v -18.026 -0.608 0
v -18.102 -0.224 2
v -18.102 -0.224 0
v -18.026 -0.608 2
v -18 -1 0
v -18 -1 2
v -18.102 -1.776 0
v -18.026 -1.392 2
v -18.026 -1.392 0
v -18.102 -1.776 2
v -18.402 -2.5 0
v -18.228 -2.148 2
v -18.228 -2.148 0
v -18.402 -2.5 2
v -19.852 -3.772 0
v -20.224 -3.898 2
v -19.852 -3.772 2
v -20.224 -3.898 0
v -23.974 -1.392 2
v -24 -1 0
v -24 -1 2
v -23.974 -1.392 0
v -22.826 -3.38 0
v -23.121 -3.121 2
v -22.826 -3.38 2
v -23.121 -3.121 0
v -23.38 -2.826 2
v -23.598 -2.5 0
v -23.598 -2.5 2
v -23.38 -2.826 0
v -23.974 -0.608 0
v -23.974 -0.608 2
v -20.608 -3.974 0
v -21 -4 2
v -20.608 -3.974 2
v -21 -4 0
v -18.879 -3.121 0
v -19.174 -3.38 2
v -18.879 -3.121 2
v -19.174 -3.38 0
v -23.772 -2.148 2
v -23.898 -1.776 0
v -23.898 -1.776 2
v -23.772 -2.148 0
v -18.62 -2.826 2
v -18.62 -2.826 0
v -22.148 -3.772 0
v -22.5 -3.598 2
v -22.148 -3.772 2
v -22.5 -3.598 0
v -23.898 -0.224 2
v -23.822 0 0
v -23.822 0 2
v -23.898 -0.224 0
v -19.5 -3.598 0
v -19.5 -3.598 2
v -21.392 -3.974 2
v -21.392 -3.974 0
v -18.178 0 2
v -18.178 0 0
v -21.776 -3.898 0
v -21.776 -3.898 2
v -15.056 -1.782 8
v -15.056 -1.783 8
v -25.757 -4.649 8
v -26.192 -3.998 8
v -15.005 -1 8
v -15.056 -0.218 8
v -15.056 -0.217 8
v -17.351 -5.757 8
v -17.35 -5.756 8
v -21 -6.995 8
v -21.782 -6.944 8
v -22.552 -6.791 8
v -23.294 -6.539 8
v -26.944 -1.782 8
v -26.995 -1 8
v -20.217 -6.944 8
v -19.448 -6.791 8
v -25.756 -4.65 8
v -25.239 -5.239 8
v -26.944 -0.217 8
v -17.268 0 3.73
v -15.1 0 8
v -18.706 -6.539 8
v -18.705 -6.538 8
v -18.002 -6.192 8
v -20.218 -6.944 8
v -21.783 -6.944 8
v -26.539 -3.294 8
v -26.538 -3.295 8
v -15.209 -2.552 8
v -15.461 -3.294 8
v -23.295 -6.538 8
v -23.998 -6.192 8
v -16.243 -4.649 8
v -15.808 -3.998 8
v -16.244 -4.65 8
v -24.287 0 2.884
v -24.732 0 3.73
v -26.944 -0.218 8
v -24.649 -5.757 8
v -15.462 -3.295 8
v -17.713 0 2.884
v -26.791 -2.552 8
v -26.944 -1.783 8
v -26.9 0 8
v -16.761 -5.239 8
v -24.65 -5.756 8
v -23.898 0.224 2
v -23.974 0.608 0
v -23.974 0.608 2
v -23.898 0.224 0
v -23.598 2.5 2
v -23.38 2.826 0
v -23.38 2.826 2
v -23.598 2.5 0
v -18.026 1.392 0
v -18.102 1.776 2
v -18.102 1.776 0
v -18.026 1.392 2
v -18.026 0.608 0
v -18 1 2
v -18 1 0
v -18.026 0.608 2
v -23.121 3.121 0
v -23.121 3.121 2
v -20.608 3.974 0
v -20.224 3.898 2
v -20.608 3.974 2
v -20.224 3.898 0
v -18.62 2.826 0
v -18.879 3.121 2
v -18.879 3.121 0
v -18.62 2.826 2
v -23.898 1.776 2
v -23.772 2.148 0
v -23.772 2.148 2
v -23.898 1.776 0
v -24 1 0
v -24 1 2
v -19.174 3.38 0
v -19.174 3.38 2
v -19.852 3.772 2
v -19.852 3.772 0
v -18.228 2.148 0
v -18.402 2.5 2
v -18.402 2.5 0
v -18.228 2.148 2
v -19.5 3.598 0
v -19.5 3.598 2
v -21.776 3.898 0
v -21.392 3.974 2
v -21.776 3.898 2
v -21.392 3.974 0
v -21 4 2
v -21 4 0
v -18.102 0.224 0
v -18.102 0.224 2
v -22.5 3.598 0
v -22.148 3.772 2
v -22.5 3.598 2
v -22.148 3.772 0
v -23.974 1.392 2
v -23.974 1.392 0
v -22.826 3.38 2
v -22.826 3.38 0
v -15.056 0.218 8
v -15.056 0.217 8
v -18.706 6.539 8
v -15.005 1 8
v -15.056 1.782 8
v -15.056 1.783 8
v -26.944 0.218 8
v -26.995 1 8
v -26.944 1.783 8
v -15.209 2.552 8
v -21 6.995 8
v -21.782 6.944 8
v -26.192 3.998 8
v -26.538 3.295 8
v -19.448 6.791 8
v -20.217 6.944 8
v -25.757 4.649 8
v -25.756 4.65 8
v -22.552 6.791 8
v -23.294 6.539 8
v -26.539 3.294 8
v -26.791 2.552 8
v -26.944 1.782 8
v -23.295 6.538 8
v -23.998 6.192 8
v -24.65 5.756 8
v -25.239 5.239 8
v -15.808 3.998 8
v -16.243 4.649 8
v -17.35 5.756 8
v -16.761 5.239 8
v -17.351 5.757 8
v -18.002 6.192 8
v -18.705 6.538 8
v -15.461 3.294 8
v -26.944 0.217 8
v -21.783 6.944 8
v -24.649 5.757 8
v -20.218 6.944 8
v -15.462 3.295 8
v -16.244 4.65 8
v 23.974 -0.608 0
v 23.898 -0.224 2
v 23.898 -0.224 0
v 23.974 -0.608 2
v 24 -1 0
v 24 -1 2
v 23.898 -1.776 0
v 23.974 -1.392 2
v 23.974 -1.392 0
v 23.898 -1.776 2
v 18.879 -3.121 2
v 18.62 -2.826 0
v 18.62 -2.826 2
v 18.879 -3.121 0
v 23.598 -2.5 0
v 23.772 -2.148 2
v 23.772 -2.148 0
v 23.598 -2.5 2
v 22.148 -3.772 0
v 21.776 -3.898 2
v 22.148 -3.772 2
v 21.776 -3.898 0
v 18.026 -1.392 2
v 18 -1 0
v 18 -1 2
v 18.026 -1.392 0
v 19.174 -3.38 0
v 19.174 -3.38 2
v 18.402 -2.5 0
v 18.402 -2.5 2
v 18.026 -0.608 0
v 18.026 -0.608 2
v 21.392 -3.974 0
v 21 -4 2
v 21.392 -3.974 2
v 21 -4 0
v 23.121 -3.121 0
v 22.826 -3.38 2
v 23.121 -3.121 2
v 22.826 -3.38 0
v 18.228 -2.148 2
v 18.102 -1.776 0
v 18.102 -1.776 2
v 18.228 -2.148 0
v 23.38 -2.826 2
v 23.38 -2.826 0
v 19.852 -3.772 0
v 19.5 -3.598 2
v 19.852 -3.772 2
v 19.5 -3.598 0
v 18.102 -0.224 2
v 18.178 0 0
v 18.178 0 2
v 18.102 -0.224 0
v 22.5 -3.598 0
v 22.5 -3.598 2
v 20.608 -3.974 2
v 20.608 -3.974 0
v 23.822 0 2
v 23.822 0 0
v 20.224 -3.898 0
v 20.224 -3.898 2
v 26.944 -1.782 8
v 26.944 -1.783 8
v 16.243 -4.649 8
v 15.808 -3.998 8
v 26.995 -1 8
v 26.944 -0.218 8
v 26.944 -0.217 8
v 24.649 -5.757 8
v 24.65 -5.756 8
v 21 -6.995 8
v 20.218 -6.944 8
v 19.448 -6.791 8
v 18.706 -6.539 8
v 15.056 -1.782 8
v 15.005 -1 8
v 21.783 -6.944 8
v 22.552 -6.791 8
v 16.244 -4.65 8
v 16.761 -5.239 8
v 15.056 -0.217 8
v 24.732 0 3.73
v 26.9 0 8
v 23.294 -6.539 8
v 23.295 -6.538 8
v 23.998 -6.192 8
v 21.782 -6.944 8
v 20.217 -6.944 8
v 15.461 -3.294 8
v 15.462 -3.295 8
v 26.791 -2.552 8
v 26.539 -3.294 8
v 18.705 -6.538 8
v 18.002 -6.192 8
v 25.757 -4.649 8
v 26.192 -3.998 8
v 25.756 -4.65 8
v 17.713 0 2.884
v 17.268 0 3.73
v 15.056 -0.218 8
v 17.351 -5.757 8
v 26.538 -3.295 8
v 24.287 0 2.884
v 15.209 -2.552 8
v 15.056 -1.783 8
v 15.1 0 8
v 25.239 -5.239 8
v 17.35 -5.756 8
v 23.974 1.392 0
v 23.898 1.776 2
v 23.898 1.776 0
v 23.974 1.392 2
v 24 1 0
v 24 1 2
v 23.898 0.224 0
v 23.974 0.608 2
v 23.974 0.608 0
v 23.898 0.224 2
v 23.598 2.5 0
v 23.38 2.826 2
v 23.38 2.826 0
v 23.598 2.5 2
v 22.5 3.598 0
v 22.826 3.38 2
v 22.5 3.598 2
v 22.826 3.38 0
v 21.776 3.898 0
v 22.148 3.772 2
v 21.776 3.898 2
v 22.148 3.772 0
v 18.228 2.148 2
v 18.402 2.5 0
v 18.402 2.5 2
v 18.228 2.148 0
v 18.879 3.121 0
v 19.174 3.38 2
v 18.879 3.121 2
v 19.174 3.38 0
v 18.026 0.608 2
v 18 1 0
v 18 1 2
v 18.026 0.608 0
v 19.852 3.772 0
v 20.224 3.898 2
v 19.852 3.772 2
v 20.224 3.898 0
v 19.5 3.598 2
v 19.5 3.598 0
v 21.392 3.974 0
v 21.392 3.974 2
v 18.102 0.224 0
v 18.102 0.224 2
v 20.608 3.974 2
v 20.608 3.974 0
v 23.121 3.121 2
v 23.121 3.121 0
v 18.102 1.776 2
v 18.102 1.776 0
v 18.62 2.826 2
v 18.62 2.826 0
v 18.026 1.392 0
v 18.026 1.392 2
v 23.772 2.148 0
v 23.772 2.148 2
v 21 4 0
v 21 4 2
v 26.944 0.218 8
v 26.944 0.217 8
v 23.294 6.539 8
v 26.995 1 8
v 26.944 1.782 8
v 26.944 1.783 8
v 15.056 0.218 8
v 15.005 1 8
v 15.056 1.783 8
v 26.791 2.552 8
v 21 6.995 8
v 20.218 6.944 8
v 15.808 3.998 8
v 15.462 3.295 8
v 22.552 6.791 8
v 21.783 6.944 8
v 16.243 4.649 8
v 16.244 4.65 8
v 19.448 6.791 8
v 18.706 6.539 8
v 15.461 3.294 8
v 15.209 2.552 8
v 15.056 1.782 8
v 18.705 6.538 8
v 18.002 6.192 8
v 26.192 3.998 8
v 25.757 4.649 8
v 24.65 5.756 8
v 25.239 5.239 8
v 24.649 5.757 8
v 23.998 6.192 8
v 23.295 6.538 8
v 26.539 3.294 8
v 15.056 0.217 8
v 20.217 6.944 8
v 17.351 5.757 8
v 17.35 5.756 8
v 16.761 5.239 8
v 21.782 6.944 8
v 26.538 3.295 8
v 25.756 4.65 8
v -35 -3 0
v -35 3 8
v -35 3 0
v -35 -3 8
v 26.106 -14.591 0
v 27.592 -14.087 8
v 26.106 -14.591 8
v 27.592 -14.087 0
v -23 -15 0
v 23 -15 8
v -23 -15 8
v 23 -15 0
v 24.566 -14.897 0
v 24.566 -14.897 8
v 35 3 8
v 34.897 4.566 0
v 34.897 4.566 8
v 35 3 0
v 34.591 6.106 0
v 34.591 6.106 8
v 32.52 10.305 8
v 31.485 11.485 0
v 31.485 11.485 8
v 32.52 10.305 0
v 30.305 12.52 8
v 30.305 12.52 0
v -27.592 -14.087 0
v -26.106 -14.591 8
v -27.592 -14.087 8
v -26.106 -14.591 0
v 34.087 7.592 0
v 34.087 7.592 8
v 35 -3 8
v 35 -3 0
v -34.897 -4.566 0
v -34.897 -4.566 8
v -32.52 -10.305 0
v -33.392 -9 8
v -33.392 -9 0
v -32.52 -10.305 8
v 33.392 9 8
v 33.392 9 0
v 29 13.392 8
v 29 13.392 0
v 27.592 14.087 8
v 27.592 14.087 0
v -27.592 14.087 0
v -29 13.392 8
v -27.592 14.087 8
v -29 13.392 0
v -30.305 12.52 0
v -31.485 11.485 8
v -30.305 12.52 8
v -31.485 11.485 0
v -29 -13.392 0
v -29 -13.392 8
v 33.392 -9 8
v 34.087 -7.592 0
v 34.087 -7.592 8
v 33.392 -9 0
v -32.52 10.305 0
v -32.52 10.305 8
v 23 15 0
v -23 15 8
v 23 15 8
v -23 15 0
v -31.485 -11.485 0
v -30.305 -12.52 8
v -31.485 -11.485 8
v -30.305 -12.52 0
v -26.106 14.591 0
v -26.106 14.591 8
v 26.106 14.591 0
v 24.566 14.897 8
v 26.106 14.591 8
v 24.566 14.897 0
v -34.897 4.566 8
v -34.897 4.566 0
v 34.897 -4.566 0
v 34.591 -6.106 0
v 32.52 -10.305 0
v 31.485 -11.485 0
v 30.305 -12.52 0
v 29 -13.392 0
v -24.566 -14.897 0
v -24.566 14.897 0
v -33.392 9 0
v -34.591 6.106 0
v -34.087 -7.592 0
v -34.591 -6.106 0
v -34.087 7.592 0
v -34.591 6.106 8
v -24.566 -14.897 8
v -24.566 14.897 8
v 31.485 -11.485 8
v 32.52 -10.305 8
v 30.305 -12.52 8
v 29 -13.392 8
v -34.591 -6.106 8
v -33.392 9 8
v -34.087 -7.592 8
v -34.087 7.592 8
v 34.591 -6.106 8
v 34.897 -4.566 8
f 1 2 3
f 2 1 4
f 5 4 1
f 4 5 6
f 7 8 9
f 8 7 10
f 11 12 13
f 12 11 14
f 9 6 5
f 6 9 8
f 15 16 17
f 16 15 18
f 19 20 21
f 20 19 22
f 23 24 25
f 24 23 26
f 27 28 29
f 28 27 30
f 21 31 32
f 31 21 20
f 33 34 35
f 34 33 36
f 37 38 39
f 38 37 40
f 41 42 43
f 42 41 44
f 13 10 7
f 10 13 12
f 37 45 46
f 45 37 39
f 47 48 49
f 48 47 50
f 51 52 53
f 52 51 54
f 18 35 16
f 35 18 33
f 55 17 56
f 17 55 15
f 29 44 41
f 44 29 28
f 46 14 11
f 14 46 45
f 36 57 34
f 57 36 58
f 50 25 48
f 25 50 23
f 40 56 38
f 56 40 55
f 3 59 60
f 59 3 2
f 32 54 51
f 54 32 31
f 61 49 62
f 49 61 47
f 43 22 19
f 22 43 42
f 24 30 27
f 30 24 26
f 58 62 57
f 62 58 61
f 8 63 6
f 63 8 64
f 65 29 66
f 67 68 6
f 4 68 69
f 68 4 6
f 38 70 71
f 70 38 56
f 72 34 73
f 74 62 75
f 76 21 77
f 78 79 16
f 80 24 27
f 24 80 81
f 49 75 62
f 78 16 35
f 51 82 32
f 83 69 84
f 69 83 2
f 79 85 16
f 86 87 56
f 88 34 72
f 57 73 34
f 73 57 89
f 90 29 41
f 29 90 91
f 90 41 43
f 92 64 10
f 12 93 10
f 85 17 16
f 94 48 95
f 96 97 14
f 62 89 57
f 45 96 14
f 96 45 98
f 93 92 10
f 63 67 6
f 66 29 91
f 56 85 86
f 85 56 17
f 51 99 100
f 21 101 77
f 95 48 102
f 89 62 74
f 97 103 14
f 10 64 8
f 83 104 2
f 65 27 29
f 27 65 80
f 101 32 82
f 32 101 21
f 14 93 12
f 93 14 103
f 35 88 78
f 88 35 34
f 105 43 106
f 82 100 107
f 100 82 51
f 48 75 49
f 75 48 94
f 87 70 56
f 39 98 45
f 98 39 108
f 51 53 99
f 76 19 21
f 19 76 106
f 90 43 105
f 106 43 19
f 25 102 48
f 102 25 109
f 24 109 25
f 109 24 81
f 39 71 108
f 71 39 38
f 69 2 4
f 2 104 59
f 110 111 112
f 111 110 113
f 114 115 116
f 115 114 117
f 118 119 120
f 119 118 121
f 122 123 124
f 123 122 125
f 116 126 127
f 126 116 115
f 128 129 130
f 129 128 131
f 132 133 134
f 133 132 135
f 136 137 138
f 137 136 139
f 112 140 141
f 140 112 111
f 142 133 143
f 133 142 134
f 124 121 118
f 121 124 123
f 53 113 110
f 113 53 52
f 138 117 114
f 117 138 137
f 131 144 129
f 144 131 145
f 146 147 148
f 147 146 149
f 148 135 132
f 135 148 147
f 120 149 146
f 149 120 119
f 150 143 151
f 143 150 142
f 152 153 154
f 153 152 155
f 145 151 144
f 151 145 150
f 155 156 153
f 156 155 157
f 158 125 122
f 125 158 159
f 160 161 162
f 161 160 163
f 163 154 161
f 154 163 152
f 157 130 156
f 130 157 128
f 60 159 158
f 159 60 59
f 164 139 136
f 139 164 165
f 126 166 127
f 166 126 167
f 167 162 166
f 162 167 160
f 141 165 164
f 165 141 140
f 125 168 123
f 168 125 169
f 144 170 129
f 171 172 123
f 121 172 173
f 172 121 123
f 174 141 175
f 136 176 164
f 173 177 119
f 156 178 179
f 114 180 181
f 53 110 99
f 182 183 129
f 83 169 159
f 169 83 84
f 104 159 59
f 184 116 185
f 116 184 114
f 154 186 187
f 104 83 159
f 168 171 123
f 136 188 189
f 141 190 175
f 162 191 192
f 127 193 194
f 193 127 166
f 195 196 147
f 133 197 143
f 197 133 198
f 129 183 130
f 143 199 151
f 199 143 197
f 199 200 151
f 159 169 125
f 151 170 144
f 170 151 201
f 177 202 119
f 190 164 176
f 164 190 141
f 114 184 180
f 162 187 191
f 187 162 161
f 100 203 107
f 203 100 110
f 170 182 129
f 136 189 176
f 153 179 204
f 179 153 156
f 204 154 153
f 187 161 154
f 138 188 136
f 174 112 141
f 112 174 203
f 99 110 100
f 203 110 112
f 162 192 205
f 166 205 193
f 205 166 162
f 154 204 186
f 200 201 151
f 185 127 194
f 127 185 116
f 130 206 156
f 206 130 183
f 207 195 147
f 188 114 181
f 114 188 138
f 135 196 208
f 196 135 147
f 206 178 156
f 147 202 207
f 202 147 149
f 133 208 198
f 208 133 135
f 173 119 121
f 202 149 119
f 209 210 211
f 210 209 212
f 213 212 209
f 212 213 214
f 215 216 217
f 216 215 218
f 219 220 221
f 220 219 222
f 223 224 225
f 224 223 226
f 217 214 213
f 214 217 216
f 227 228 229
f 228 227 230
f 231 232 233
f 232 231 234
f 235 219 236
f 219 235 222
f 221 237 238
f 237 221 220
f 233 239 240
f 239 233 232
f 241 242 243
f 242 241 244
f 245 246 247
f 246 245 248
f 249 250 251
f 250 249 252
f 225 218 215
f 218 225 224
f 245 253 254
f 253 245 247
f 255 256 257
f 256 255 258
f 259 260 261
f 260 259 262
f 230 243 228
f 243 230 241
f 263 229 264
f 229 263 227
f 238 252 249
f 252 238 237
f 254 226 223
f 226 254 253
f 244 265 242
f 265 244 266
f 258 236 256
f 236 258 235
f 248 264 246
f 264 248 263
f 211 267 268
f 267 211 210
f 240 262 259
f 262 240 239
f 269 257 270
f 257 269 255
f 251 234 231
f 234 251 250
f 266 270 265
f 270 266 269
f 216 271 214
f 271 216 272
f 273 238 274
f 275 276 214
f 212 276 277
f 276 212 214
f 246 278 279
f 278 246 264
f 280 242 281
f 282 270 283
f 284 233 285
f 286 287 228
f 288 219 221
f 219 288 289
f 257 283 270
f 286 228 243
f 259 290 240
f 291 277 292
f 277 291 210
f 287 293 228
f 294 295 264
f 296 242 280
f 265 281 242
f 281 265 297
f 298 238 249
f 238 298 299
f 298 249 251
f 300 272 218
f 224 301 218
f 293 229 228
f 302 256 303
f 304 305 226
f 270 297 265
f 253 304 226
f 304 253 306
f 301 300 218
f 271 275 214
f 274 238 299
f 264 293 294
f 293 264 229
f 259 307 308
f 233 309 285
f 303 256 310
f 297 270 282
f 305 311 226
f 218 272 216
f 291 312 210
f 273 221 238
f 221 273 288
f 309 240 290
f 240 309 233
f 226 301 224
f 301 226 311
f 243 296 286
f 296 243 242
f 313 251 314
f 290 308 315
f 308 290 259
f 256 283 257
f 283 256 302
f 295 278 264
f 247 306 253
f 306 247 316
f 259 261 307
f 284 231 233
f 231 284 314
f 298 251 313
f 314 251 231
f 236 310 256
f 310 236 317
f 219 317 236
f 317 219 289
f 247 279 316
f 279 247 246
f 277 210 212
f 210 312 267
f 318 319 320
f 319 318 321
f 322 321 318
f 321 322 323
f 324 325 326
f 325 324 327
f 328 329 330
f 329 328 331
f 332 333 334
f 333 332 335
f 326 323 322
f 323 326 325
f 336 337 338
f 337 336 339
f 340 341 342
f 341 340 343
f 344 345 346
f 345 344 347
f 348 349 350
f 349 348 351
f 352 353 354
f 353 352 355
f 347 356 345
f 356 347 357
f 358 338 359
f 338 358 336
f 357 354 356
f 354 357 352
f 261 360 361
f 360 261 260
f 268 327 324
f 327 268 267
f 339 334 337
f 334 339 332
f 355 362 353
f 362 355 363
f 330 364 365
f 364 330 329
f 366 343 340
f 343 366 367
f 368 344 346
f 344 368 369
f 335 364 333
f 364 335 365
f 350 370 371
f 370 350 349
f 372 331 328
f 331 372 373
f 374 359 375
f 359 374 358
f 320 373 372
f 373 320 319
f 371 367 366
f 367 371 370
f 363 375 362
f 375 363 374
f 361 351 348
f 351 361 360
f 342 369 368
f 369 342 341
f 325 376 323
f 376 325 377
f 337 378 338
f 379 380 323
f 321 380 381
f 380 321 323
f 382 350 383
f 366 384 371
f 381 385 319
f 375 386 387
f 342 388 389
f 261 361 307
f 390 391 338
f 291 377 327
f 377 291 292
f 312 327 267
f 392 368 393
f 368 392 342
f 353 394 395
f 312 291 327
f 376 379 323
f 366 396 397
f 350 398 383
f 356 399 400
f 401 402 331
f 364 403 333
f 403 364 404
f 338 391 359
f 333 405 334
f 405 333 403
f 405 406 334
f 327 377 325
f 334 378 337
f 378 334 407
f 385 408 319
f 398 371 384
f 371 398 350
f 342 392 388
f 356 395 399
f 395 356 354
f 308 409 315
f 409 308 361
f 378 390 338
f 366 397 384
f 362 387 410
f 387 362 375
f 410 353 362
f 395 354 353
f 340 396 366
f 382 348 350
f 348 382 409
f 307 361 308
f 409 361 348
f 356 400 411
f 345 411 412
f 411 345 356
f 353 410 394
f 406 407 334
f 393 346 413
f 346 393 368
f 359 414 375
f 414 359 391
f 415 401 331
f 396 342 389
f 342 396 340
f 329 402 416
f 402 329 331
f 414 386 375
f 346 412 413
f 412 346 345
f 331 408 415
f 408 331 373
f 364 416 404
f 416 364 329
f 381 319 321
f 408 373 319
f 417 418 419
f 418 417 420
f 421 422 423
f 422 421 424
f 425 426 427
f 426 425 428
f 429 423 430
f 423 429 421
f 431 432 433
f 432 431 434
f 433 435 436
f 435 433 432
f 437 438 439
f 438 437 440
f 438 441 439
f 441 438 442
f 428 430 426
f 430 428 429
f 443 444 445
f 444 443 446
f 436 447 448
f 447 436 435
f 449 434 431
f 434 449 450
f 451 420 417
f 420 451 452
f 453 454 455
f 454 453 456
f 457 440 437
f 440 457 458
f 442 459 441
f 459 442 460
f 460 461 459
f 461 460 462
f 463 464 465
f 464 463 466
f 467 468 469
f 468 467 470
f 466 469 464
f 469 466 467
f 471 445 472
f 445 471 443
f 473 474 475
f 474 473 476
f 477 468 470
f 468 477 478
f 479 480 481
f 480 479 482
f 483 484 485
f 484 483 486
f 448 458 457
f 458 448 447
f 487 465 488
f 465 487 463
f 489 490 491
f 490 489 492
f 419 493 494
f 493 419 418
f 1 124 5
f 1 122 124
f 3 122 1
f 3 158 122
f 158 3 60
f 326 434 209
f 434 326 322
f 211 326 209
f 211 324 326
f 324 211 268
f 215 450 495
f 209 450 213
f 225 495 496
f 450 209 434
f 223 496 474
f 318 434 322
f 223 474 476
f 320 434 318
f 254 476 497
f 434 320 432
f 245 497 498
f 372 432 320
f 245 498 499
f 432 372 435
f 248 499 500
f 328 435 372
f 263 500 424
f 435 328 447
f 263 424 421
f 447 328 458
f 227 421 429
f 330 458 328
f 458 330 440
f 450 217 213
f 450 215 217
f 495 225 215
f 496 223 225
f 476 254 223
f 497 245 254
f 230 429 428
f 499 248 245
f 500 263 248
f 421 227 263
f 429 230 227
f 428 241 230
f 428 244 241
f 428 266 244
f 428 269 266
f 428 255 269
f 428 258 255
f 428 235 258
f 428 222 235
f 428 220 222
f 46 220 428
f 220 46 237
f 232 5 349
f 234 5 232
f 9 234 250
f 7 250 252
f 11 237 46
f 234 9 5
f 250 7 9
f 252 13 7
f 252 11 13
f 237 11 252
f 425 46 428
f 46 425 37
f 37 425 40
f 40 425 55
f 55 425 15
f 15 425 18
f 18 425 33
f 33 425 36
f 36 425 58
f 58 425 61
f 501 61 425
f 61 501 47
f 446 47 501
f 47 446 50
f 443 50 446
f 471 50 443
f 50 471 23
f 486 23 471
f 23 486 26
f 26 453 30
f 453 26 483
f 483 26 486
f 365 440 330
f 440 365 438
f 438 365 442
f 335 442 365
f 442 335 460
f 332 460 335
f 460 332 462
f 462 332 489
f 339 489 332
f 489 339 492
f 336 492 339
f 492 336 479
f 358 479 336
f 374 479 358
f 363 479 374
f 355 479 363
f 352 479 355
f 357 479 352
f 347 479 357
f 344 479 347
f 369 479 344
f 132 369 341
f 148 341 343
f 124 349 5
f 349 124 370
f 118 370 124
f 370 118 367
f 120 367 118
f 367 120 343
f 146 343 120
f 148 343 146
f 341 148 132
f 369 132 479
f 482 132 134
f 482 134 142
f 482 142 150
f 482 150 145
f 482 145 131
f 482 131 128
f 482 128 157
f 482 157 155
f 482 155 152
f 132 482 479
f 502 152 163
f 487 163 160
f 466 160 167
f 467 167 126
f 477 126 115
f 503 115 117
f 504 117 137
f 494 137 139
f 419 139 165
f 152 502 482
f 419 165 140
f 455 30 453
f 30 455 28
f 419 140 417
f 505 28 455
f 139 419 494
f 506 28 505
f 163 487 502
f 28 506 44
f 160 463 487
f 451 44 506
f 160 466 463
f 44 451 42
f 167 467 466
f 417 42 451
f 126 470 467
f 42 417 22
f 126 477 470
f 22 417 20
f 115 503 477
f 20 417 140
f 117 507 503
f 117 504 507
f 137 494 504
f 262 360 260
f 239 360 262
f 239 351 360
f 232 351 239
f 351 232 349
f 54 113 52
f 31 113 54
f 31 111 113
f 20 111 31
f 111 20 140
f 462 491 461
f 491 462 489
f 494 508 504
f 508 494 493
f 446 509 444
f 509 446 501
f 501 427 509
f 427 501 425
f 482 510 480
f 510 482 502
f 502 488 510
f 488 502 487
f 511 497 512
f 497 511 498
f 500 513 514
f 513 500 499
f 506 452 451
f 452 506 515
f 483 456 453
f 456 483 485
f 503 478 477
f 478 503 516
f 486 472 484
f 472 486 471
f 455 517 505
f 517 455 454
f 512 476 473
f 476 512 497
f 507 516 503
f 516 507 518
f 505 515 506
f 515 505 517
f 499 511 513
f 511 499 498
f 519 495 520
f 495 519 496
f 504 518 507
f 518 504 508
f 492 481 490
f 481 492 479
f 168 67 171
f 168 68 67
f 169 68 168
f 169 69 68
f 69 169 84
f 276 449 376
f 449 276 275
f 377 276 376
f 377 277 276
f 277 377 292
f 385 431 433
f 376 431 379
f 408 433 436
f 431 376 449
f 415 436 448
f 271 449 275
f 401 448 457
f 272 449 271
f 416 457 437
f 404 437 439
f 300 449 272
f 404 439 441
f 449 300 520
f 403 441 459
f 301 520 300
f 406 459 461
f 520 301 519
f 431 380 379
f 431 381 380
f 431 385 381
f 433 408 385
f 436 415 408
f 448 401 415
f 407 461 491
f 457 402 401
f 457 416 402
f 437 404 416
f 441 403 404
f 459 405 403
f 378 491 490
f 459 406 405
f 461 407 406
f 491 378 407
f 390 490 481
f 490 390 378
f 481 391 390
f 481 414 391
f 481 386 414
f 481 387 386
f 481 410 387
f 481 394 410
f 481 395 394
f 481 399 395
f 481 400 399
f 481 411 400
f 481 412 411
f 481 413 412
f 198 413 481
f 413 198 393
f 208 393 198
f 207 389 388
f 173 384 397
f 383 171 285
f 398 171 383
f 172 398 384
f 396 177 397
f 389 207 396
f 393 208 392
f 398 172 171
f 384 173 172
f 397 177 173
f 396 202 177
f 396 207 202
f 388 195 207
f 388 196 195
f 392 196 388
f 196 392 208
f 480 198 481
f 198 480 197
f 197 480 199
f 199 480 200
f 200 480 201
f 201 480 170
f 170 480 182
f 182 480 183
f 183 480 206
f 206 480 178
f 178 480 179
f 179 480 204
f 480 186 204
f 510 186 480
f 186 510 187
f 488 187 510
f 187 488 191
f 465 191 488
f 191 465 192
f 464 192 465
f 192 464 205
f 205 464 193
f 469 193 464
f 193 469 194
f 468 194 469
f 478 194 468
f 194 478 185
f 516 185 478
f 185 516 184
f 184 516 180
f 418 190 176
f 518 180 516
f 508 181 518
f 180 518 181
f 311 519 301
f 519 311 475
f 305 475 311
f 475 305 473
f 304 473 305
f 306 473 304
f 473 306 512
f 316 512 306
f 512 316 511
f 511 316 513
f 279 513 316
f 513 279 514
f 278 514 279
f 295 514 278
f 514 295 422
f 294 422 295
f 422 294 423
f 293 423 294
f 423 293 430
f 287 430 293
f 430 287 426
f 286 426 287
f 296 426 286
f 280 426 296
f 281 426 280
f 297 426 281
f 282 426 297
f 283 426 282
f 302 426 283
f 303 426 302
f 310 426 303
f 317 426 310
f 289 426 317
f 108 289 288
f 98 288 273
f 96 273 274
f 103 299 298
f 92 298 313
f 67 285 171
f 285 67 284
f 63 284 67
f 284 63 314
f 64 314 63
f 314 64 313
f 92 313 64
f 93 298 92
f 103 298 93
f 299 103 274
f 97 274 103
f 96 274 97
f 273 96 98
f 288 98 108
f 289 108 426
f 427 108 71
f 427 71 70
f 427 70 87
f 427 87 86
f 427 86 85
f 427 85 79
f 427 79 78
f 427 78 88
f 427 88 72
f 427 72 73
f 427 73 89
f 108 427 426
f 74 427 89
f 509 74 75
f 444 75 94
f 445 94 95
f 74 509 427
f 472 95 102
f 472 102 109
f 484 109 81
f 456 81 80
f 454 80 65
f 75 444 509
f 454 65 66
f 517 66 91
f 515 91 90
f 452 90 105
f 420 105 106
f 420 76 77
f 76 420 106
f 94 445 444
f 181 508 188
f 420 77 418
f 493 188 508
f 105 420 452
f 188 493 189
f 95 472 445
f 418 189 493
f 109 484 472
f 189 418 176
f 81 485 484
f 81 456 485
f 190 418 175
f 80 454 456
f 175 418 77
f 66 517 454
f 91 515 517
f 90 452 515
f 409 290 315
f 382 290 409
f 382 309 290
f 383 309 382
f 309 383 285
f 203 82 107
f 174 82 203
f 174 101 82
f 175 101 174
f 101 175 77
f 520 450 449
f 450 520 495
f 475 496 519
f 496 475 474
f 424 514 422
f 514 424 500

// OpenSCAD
// Rounded mounting plate - a flat plate with rounded corners and a countersunk screw hole near each
// corner. Teaches 2D corner rounding with offset() and a countersink (chamfered hole). NOVEL part.
//
// @desc flat plate, rounded corners, countersunk holes
// @prompt Design a mounting plate in OpenSCAD: {L} by {W} mm and {t} mm thick, with {r} mm rounded corners and a countersunk hole for an {screw} mm screw near each corner. Reply with a single complete OpenSCAD file.
// @param L     length, mm           [40:120]
// @param W     width, mm            [30:90]
// @param t     thickness, mm        [3:8]
// @param r     corner radius, mm    [3:12]
// @param screw screw diameter, mm   [3:6]

L     = 70;
W     = 30;
t     = 8;
r     = 12;
screw = 6;

$fn = 48;

inset = r + 2;                     // hole-centre inset from the edges
head  = screw * 2;                 // countersink top diameter
csk   = min(screw, t - 1);         // countersink depth

module rounded_rect(l, w, rad) {
    offset(r = rad) square([l - 2 * rad, w - 2 * rad], center = true);
}

difference() {
    linear_extrude(t) rounded_rect(L, W, r);
    for (sx = [-1, 1], sy = [-1, 1])
        translate([sx * (L / 2 - inset), sy * (W / 2 - inset), 0]) {
            translate([0, 0, -1]) cylinder(h = t + 2, d = screw);                       // shank
            translate([0, 0, t - csk]) cylinder(h = csk + 0.01, d1 = screw, d2 = head); // countersink
        }
}
